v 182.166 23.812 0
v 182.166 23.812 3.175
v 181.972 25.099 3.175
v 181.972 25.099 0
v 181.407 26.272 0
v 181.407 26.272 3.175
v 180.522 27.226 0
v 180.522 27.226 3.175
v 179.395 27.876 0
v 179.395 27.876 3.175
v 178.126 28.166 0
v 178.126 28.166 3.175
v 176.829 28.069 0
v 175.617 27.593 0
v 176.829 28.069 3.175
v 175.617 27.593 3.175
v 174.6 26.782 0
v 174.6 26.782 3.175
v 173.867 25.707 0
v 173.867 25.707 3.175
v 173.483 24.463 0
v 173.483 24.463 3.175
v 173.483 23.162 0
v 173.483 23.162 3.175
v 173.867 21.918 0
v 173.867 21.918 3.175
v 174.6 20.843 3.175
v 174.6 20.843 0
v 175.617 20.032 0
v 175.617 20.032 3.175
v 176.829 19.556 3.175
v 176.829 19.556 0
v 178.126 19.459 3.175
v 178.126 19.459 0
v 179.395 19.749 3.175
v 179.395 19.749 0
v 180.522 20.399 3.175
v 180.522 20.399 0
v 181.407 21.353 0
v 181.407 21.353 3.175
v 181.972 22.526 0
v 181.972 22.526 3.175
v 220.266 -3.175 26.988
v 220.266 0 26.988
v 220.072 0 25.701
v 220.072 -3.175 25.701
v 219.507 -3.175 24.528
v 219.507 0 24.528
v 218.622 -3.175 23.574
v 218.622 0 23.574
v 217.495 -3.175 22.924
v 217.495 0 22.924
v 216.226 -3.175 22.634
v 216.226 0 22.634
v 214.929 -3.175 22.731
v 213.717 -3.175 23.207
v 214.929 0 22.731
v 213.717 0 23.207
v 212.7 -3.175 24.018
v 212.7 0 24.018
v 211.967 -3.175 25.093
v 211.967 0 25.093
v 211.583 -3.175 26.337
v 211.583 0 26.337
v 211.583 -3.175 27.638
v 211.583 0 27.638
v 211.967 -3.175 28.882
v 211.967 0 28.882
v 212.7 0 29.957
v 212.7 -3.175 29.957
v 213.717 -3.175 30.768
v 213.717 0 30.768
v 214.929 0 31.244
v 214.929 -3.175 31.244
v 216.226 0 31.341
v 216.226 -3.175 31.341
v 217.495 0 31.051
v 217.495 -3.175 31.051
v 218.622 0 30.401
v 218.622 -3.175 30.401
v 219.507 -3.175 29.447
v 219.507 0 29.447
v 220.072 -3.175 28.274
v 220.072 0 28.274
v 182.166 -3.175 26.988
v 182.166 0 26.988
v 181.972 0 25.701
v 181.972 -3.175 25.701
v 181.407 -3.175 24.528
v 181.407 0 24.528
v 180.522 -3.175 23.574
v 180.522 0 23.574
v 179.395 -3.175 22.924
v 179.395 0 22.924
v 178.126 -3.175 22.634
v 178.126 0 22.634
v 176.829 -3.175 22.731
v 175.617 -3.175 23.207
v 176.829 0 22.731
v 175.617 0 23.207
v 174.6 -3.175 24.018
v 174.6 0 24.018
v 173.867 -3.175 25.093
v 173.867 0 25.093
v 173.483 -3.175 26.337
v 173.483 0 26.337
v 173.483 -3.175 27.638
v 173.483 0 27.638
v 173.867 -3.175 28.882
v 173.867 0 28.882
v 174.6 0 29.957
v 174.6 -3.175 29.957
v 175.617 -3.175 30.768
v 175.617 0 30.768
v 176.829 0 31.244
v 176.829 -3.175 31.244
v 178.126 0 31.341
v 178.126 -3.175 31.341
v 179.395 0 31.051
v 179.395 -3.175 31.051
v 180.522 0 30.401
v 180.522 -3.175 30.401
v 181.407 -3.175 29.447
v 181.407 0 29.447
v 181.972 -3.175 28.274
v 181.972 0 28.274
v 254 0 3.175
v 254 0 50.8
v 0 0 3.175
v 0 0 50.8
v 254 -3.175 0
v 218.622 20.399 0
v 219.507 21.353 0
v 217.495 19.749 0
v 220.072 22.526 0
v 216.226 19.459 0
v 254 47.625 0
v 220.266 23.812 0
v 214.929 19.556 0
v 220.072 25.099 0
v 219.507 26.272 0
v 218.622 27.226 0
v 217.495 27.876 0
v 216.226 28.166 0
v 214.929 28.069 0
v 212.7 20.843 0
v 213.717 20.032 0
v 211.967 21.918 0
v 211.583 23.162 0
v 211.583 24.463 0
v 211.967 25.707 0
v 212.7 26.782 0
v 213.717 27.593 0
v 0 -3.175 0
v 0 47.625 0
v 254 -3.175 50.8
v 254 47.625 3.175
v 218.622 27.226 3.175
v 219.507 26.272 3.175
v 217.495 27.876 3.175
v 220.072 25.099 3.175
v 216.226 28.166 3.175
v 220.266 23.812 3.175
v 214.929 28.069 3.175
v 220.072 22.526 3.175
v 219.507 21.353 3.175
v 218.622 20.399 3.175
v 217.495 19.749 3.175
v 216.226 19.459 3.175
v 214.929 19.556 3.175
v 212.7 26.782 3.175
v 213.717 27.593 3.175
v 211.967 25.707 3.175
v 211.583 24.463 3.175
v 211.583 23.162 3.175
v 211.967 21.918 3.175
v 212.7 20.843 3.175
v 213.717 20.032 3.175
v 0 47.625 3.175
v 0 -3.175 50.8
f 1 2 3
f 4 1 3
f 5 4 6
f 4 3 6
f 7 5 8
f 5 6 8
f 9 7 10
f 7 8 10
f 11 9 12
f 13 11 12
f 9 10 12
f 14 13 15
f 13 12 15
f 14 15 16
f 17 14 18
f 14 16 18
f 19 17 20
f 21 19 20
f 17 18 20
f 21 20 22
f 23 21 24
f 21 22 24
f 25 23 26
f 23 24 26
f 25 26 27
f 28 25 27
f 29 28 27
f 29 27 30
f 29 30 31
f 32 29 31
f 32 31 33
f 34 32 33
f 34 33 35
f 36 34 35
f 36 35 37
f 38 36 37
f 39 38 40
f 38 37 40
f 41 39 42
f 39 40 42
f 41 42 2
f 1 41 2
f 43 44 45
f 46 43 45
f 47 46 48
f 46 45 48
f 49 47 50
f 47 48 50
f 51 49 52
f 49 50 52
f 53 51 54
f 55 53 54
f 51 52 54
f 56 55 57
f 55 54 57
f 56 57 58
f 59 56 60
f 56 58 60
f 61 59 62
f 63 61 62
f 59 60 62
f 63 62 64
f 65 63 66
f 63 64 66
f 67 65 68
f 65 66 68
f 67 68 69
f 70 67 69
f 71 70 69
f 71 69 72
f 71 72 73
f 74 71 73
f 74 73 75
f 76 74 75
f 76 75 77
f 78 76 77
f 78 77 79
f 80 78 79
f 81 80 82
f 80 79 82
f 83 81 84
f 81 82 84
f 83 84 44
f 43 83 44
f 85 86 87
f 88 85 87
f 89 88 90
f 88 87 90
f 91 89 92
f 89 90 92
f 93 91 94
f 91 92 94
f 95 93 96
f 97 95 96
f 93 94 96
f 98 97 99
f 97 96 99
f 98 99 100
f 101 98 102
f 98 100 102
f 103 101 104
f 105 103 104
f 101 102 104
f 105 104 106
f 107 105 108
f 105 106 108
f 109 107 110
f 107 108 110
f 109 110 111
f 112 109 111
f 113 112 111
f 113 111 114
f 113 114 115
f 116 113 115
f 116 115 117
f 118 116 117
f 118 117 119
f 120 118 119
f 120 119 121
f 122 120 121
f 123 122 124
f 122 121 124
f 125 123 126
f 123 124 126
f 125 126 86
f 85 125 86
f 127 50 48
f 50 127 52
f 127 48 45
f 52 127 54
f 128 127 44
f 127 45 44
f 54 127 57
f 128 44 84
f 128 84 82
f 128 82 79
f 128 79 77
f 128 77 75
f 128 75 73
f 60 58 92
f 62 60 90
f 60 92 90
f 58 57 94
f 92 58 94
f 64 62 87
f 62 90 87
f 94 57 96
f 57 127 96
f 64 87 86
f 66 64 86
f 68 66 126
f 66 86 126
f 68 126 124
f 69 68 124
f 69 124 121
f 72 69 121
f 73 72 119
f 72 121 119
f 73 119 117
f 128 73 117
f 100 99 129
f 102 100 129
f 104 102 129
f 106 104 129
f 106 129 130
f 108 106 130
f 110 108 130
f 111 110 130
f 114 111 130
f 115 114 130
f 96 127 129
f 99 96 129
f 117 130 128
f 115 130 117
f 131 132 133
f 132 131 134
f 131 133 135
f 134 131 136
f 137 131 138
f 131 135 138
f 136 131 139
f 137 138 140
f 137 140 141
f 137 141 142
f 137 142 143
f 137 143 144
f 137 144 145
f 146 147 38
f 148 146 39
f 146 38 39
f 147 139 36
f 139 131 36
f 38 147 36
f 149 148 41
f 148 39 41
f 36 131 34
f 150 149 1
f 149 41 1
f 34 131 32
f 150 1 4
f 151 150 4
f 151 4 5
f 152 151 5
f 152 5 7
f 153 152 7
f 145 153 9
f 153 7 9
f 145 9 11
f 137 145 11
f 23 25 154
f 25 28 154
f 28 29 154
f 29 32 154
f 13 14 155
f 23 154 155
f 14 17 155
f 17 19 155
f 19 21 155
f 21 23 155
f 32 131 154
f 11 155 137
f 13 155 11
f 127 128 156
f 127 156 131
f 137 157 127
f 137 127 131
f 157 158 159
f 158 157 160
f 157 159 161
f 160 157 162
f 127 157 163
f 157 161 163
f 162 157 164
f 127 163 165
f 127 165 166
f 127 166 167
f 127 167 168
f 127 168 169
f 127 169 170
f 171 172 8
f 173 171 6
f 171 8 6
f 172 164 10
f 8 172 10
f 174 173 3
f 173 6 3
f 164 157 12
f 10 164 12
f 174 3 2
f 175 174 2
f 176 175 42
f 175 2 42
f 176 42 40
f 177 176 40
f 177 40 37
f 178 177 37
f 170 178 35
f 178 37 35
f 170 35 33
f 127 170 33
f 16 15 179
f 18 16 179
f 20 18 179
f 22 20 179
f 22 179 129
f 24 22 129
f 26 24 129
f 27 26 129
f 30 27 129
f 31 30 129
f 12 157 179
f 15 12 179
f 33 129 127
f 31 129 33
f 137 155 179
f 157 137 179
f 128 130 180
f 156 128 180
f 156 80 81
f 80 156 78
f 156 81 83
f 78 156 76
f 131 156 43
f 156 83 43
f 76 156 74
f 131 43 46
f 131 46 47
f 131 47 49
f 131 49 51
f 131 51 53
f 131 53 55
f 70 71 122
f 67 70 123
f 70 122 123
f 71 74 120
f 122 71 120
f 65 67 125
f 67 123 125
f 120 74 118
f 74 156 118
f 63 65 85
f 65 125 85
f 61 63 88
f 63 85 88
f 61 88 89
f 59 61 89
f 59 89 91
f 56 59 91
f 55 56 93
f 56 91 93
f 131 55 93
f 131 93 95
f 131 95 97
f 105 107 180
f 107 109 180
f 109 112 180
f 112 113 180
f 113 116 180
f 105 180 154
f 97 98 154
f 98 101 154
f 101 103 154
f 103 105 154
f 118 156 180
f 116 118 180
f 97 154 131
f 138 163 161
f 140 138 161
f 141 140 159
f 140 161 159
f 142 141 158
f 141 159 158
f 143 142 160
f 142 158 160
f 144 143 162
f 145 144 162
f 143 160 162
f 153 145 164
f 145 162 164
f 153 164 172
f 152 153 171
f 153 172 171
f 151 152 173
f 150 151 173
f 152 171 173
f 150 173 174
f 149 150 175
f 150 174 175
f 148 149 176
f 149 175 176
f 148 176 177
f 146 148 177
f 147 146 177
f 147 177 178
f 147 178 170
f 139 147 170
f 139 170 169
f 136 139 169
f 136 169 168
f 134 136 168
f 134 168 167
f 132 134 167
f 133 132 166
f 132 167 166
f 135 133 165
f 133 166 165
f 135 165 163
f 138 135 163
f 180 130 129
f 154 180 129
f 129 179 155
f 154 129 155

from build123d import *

# Parameters (mm, degrees)
BOSS_EXTRUDE1_DEPTH = 254
SKETCH2_R           = 4.365625
CUT_EXTRUDE1_DEPTH  = 3.175
SKETCH3_R           = 4.365625
CUT_EXTRUDE2_DEPTH  = 3.175


with BuildPart() as part:
    # Sketch1 → Boss-Extrude1 (new body)
    with BuildSketch(Plane(origin=(0, 0, 0), x_dir=(0, 0, -1), z_dir=(1, 0, 0))):
        Polygon((-3.175, 0), (-50.8, 0), (-50.8, -3.175), (0, -3.175), (0, 0), (0, 47.625), (-3.175, 47.625), align=None)
    extrude(amount=BOSS_EXTRUDE1_DEPTH)

    # Sketch2 → Cut-Extrude1 (cut)
    with BuildSketch(Plane.XY.offset(3.175)):
        with Locations((177.8, 23.8125)):
            Circle(SKETCH2_R)
        with Locations((215.9, 23.8125)):
            Circle(SKETCH2_R)
    extrude(amount=-CUT_EXTRUDE1_DEPTH, mode=Mode.SUBTRACT)

    # Sketch3 → Cut-Extrude2 (cut)
    with BuildSketch(Plane(origin=(0, 0, 0), x_dir=(1, 0, 0), z_dir=(0, 1, 0))):
        with Locations((177.8, -26.9875)):
            Circle(SKETCH3_R)
        with Locations((215.9, -26.9875)):
            Circle(SKETCH3_R)
    extrude(amount=-CUT_EXTRUDE2_DEPTH, mode=Mode.SUBTRACT)


solid = part.part
